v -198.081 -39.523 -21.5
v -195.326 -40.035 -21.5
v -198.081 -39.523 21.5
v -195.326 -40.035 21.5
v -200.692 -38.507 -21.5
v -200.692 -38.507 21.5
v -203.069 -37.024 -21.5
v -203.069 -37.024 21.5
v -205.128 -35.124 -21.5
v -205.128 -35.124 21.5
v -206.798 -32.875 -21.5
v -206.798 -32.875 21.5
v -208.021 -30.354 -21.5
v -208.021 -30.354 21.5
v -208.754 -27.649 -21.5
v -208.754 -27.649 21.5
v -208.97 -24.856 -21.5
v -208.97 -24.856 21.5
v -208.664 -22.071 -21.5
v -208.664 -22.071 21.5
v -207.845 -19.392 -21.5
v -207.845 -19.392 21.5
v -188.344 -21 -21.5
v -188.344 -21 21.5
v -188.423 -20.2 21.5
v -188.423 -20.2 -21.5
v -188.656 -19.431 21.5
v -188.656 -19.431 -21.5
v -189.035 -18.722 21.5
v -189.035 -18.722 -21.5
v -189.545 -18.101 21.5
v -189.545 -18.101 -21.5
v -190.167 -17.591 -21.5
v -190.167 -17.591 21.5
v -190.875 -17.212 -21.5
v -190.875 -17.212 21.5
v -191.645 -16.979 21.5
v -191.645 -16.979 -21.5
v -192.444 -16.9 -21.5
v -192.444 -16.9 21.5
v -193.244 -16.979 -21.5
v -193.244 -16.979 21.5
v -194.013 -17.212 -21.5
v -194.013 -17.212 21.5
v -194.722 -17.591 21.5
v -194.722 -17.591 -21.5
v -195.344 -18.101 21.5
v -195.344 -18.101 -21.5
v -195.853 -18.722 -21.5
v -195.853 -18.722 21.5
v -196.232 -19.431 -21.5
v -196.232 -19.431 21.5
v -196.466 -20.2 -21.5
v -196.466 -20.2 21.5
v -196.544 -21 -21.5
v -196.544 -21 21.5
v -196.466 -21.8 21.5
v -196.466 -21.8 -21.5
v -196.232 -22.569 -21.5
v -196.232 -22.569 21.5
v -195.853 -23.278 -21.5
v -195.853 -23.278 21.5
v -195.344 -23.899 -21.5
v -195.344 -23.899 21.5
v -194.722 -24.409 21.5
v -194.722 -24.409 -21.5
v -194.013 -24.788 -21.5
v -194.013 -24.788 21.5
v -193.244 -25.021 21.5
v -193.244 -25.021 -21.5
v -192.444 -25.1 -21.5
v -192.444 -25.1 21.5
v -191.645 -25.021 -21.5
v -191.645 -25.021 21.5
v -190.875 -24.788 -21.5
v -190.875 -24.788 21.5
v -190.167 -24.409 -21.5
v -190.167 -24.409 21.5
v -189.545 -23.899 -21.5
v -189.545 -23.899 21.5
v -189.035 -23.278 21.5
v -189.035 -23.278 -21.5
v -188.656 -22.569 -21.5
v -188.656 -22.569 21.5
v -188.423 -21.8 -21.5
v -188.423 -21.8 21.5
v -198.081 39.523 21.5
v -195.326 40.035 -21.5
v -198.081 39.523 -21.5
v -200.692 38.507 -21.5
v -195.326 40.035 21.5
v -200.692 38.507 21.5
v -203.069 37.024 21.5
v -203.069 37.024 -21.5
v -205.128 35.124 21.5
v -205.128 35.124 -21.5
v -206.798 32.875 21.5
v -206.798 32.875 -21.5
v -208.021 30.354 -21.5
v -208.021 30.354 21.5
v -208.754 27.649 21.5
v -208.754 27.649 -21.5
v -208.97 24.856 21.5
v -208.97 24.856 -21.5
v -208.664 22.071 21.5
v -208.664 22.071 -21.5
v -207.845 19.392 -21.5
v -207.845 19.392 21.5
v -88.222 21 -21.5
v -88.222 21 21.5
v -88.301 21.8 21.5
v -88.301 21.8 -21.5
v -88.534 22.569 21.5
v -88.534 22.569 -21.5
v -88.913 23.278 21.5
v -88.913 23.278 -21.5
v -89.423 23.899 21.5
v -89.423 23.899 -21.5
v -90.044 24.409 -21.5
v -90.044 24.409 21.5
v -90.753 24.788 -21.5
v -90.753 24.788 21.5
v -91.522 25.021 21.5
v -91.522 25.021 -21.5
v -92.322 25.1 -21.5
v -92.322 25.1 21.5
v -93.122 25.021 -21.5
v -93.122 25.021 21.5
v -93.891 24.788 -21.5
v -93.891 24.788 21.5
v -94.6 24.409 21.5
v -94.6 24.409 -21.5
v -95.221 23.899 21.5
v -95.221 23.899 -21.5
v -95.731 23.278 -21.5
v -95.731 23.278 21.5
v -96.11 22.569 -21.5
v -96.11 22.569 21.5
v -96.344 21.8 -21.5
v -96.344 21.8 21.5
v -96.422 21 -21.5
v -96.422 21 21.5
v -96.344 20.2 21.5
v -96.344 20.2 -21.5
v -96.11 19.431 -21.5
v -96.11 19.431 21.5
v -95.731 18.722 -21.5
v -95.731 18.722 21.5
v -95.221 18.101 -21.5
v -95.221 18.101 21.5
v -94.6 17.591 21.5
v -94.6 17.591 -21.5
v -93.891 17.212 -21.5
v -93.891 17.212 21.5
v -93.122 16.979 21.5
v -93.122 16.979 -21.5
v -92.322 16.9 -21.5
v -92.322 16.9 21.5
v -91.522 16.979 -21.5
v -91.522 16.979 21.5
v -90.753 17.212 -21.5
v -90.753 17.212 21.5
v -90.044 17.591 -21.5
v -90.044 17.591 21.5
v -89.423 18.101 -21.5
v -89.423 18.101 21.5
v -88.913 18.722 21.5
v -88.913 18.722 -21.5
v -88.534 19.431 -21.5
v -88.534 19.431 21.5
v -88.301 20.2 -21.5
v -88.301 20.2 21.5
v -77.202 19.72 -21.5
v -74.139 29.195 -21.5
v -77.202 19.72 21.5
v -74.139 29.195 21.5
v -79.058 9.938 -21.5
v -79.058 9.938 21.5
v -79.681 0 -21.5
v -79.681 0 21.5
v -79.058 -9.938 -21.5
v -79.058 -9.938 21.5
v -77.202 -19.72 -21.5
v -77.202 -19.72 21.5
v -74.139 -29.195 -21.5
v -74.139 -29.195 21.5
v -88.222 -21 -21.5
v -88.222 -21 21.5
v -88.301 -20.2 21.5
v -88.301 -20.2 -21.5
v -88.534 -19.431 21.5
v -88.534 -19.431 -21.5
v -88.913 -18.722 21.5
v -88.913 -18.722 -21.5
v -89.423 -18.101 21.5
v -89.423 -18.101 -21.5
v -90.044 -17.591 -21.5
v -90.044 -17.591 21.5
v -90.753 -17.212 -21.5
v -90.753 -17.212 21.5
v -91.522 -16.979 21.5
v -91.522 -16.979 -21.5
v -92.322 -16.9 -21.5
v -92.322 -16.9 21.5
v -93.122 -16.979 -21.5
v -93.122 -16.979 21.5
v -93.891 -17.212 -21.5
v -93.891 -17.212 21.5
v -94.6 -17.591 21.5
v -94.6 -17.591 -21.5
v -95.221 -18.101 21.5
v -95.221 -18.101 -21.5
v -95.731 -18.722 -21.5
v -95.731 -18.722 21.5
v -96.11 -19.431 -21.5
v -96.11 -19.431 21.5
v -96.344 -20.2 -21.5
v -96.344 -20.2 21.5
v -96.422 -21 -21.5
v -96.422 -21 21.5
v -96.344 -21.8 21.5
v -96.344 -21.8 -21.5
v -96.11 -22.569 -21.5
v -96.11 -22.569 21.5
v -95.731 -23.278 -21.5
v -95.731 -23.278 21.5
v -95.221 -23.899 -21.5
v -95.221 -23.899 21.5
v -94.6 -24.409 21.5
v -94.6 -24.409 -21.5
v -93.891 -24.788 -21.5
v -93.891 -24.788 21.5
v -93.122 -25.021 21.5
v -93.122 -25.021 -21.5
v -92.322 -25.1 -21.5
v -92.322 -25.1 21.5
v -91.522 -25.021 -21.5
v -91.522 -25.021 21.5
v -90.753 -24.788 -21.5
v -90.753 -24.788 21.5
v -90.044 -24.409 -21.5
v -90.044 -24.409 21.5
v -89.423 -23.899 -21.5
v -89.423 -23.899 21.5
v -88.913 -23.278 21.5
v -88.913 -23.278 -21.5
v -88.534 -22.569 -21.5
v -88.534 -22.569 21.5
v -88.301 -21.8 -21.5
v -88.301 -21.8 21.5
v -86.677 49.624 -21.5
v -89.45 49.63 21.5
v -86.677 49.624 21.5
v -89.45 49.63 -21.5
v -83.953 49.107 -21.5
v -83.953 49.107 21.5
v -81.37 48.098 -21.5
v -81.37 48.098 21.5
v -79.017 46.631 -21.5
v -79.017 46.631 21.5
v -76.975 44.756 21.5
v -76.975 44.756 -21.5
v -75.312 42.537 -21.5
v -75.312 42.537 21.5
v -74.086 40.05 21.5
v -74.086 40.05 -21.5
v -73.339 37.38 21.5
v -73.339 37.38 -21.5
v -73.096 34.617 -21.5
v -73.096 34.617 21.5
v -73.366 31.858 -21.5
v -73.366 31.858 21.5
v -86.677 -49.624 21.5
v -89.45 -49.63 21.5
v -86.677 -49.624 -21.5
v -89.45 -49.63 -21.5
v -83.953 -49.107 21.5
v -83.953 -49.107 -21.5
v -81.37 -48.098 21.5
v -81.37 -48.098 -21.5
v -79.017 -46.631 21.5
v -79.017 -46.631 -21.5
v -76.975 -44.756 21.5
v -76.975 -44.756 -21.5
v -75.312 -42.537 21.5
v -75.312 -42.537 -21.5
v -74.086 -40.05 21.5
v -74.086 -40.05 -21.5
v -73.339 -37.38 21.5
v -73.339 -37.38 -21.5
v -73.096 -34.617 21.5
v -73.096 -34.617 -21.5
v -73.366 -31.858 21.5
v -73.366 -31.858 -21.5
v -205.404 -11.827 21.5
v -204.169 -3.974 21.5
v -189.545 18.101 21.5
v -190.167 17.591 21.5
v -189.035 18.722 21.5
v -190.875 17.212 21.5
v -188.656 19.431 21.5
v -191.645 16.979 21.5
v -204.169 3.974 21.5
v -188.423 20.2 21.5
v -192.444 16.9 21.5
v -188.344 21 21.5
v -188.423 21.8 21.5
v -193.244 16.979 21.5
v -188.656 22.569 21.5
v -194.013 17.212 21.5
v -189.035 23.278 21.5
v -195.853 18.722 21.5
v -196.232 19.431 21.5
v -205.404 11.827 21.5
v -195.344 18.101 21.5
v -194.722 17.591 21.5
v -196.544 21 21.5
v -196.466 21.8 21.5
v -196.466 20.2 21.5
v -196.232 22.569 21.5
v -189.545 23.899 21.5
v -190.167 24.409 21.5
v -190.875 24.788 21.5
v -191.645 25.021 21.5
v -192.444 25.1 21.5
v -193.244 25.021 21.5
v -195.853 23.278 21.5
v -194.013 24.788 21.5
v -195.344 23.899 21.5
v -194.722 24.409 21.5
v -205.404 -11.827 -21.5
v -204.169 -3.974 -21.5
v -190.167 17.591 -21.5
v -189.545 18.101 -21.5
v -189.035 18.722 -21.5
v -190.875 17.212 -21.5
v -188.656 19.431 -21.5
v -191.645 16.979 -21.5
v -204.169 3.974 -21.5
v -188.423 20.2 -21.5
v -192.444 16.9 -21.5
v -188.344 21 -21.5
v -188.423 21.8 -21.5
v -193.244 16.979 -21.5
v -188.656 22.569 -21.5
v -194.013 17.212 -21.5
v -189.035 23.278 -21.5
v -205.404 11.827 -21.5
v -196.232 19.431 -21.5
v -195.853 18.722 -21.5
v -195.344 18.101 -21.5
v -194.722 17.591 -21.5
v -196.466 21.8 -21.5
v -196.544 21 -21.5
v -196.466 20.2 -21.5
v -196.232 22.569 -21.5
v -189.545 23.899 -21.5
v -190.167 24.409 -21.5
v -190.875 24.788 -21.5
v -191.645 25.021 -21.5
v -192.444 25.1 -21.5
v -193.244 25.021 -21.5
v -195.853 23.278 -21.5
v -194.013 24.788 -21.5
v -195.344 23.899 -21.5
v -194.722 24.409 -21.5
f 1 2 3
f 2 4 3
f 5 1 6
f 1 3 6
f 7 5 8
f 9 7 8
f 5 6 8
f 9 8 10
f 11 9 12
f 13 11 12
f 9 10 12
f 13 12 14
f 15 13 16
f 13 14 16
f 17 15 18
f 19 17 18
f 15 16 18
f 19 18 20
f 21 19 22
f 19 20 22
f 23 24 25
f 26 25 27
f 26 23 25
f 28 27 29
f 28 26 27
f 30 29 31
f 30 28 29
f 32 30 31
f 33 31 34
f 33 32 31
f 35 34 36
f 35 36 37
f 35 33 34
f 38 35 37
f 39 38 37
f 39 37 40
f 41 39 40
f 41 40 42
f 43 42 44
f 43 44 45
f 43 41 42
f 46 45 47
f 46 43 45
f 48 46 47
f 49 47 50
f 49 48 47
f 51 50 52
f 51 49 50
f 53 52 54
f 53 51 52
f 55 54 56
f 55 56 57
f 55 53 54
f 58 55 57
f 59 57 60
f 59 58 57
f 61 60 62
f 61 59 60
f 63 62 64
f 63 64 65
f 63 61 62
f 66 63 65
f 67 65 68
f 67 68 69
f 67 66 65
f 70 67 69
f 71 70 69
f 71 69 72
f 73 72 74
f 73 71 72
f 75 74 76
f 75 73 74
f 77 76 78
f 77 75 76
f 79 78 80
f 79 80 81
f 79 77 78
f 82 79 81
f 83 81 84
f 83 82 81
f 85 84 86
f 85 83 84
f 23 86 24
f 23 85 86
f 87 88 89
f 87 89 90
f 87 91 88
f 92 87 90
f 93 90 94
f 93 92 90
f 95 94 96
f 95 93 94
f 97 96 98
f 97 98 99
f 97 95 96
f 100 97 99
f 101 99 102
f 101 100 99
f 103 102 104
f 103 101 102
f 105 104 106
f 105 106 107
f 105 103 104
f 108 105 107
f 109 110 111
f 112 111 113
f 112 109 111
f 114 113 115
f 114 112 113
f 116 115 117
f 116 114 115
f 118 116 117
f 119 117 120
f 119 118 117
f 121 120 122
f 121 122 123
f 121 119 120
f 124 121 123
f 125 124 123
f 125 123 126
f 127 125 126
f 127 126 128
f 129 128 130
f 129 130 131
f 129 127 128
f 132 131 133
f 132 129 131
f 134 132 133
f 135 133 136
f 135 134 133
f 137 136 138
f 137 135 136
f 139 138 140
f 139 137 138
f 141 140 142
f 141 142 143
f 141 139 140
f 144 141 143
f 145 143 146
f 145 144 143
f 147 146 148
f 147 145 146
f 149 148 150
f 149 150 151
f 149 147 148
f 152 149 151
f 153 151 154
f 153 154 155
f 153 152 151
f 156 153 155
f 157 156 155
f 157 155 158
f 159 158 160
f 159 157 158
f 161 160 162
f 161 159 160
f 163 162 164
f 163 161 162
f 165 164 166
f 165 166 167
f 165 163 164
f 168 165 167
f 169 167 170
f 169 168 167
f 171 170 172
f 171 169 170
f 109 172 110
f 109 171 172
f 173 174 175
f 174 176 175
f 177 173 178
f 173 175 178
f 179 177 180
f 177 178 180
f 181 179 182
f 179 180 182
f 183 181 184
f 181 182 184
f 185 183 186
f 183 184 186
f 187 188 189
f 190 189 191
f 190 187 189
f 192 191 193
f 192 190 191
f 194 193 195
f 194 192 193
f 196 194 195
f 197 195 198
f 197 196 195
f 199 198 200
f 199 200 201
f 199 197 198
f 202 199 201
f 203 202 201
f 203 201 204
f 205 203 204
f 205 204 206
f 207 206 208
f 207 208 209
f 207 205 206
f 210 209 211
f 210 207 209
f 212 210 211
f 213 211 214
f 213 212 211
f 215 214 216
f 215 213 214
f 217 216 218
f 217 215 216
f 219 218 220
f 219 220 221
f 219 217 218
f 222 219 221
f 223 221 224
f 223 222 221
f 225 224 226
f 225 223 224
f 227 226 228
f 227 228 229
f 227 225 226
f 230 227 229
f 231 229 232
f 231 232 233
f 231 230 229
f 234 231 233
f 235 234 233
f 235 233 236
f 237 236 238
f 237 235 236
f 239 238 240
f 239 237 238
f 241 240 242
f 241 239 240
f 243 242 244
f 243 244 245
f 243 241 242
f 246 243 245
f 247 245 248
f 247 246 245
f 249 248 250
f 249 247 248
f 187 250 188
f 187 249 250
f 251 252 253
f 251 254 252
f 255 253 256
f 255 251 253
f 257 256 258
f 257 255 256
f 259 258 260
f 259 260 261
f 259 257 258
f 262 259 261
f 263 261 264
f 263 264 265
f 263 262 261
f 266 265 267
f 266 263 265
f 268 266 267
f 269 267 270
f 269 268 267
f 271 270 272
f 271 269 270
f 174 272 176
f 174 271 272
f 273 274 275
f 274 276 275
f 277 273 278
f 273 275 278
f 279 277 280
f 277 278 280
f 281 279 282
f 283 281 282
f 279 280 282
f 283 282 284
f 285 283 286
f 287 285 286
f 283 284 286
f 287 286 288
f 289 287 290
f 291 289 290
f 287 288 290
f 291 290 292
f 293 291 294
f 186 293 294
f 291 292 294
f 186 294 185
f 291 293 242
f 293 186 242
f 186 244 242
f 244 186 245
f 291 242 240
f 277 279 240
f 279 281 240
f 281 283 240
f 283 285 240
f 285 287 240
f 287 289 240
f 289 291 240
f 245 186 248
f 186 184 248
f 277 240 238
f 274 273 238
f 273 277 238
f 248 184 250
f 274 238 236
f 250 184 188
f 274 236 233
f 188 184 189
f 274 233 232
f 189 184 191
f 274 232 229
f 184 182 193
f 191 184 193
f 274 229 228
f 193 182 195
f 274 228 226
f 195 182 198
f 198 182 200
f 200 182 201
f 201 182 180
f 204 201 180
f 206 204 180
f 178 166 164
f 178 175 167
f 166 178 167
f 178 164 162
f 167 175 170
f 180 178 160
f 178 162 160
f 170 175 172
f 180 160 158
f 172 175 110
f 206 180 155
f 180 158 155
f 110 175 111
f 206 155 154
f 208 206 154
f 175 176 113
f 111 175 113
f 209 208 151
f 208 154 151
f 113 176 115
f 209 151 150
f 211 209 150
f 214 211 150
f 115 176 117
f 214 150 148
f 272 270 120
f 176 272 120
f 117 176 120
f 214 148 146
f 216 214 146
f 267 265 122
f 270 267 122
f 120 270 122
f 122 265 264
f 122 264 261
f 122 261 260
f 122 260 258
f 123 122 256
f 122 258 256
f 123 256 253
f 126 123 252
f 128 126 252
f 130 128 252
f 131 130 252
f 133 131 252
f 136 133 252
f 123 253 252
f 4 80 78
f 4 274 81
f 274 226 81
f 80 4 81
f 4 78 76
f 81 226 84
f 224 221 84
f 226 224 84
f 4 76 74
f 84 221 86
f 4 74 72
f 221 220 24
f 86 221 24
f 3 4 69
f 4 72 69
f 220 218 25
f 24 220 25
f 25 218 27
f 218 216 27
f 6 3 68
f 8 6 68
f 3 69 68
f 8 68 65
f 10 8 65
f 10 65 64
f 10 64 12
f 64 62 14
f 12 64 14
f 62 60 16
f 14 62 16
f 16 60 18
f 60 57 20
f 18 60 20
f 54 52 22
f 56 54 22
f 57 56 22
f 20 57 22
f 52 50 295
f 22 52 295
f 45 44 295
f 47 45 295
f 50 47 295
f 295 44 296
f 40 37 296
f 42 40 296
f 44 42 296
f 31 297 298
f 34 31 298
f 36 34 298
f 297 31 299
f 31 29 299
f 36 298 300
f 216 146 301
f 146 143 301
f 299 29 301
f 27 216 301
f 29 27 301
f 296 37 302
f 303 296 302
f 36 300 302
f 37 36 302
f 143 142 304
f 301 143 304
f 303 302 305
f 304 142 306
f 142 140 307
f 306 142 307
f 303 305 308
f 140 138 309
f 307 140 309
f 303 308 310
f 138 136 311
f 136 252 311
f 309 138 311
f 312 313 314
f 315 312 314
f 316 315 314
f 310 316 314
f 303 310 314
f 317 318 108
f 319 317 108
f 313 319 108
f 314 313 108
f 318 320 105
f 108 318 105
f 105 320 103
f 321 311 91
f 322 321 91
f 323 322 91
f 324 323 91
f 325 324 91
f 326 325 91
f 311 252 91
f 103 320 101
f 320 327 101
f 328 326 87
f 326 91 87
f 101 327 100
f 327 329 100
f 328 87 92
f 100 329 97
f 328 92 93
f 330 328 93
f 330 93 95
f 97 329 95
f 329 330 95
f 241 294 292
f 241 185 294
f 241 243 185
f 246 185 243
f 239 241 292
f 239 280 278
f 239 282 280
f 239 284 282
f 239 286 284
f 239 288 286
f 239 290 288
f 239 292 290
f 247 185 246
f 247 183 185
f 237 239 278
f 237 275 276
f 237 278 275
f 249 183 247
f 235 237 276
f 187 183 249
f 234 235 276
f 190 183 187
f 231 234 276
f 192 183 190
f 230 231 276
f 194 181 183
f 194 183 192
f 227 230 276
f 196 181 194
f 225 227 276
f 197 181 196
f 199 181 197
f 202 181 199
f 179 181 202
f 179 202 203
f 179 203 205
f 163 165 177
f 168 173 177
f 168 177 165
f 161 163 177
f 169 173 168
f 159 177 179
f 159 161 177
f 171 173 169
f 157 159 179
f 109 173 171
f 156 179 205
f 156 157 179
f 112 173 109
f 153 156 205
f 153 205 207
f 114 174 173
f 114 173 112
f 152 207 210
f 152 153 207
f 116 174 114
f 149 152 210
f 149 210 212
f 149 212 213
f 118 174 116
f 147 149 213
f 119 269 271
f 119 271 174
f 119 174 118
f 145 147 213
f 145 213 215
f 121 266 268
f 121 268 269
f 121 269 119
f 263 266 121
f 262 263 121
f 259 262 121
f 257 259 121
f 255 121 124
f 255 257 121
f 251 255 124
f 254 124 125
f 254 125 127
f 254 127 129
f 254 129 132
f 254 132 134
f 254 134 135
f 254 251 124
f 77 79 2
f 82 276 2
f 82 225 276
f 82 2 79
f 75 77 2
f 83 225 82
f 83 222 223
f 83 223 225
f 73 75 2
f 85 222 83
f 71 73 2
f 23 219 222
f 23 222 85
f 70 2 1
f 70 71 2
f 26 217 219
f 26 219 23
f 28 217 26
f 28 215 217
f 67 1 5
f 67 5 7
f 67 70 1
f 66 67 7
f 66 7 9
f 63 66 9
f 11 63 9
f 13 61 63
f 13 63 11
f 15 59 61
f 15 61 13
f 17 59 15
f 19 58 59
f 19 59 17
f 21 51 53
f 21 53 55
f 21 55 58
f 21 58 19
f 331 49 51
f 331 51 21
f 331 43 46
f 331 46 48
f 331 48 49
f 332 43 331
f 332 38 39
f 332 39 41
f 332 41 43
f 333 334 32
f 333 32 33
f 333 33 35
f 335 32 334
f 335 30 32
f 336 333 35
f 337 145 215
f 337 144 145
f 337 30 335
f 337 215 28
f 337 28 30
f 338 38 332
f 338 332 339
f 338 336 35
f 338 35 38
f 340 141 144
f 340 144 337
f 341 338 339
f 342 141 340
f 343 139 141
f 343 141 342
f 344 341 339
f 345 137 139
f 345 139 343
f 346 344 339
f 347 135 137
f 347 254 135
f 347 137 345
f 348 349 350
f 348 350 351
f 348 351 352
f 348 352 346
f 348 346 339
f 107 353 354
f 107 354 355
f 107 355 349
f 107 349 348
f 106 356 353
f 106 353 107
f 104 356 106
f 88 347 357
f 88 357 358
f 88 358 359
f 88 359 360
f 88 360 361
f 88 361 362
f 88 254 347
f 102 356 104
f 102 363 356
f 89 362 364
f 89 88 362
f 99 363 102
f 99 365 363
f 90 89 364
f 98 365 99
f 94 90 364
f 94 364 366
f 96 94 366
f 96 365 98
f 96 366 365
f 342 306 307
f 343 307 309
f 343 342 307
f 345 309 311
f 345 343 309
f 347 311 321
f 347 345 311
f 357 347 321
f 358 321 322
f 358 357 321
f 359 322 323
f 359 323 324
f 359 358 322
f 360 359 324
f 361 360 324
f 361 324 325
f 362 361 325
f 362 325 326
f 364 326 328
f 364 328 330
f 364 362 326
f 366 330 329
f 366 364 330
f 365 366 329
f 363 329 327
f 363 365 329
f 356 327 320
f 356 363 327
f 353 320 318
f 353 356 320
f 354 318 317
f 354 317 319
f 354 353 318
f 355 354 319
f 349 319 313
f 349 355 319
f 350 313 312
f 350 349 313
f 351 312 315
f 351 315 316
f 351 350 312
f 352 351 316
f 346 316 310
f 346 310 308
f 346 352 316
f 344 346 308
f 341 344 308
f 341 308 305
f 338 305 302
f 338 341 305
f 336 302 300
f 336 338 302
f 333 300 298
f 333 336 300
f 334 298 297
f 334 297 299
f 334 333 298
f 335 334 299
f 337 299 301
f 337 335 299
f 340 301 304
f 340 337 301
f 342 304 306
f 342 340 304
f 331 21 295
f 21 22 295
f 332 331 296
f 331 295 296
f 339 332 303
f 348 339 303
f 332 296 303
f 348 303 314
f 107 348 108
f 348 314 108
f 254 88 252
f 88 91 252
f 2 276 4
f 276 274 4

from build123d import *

# Parameters (mm, degrees)
SKETCH_1_R      = 4.1
EXTRUDE_1_DEPTH = 21.5
FILLET_1_R      = 15


with BuildPart() as part:
    # Sketch 1 → Extrude 1 (new, symmetric)
    with BuildSketch(Plane.XY):
        with BuildLine():
            Line((-220.71165321, 37.734887356), (-60.125305402, 52.28709885))
            ThreePointArc((-60.125305402, 52.28709885), (-79.680568873, 0), (-60.125305402, -52.28709885))
            Line((-60.125305402, -52.28709885), (-220.71165321, -37.734887356))
            ThreePointArc((-220.71165321, -37.734887356), (-204.013605252, 0), (-220.71165321, 37.734887356))
        make_face()
        with Locations((-192.444390405, 21)):
            Circle(SKETCH_1_R, mode=Mode.SUBTRACT)
        with Locations((-192.444390405, -21)):
            Circle(SKETCH_1_R, mode=Mode.SUBTRACT)
        with Locations((-92.32231649, -21)):
            Circle(SKETCH_1_R, mode=Mode.SUBTRACT)
        with Locations((-92.32231649, 21)):
            Circle(SKETCH_1_R, mode=Mode.SUBTRACT)
    extrude(amount=EXTRUDE_1_DEPTH, both=True)

    # Fillet 1
    fillet_1_edges = [part.edges().sort_by_distance(p)[0] for p in [
        (-220.71165321, 37.734887356, 0),
        (-60.125305402, 52.28709885, 0),
        (-60.125305402, -52.28709885, 0),
        (-220.71165321, -37.734887356, 0),
    ]]
    fillet(fillet_1_edges, radius=FILLET_1_R)


solid = part.part
